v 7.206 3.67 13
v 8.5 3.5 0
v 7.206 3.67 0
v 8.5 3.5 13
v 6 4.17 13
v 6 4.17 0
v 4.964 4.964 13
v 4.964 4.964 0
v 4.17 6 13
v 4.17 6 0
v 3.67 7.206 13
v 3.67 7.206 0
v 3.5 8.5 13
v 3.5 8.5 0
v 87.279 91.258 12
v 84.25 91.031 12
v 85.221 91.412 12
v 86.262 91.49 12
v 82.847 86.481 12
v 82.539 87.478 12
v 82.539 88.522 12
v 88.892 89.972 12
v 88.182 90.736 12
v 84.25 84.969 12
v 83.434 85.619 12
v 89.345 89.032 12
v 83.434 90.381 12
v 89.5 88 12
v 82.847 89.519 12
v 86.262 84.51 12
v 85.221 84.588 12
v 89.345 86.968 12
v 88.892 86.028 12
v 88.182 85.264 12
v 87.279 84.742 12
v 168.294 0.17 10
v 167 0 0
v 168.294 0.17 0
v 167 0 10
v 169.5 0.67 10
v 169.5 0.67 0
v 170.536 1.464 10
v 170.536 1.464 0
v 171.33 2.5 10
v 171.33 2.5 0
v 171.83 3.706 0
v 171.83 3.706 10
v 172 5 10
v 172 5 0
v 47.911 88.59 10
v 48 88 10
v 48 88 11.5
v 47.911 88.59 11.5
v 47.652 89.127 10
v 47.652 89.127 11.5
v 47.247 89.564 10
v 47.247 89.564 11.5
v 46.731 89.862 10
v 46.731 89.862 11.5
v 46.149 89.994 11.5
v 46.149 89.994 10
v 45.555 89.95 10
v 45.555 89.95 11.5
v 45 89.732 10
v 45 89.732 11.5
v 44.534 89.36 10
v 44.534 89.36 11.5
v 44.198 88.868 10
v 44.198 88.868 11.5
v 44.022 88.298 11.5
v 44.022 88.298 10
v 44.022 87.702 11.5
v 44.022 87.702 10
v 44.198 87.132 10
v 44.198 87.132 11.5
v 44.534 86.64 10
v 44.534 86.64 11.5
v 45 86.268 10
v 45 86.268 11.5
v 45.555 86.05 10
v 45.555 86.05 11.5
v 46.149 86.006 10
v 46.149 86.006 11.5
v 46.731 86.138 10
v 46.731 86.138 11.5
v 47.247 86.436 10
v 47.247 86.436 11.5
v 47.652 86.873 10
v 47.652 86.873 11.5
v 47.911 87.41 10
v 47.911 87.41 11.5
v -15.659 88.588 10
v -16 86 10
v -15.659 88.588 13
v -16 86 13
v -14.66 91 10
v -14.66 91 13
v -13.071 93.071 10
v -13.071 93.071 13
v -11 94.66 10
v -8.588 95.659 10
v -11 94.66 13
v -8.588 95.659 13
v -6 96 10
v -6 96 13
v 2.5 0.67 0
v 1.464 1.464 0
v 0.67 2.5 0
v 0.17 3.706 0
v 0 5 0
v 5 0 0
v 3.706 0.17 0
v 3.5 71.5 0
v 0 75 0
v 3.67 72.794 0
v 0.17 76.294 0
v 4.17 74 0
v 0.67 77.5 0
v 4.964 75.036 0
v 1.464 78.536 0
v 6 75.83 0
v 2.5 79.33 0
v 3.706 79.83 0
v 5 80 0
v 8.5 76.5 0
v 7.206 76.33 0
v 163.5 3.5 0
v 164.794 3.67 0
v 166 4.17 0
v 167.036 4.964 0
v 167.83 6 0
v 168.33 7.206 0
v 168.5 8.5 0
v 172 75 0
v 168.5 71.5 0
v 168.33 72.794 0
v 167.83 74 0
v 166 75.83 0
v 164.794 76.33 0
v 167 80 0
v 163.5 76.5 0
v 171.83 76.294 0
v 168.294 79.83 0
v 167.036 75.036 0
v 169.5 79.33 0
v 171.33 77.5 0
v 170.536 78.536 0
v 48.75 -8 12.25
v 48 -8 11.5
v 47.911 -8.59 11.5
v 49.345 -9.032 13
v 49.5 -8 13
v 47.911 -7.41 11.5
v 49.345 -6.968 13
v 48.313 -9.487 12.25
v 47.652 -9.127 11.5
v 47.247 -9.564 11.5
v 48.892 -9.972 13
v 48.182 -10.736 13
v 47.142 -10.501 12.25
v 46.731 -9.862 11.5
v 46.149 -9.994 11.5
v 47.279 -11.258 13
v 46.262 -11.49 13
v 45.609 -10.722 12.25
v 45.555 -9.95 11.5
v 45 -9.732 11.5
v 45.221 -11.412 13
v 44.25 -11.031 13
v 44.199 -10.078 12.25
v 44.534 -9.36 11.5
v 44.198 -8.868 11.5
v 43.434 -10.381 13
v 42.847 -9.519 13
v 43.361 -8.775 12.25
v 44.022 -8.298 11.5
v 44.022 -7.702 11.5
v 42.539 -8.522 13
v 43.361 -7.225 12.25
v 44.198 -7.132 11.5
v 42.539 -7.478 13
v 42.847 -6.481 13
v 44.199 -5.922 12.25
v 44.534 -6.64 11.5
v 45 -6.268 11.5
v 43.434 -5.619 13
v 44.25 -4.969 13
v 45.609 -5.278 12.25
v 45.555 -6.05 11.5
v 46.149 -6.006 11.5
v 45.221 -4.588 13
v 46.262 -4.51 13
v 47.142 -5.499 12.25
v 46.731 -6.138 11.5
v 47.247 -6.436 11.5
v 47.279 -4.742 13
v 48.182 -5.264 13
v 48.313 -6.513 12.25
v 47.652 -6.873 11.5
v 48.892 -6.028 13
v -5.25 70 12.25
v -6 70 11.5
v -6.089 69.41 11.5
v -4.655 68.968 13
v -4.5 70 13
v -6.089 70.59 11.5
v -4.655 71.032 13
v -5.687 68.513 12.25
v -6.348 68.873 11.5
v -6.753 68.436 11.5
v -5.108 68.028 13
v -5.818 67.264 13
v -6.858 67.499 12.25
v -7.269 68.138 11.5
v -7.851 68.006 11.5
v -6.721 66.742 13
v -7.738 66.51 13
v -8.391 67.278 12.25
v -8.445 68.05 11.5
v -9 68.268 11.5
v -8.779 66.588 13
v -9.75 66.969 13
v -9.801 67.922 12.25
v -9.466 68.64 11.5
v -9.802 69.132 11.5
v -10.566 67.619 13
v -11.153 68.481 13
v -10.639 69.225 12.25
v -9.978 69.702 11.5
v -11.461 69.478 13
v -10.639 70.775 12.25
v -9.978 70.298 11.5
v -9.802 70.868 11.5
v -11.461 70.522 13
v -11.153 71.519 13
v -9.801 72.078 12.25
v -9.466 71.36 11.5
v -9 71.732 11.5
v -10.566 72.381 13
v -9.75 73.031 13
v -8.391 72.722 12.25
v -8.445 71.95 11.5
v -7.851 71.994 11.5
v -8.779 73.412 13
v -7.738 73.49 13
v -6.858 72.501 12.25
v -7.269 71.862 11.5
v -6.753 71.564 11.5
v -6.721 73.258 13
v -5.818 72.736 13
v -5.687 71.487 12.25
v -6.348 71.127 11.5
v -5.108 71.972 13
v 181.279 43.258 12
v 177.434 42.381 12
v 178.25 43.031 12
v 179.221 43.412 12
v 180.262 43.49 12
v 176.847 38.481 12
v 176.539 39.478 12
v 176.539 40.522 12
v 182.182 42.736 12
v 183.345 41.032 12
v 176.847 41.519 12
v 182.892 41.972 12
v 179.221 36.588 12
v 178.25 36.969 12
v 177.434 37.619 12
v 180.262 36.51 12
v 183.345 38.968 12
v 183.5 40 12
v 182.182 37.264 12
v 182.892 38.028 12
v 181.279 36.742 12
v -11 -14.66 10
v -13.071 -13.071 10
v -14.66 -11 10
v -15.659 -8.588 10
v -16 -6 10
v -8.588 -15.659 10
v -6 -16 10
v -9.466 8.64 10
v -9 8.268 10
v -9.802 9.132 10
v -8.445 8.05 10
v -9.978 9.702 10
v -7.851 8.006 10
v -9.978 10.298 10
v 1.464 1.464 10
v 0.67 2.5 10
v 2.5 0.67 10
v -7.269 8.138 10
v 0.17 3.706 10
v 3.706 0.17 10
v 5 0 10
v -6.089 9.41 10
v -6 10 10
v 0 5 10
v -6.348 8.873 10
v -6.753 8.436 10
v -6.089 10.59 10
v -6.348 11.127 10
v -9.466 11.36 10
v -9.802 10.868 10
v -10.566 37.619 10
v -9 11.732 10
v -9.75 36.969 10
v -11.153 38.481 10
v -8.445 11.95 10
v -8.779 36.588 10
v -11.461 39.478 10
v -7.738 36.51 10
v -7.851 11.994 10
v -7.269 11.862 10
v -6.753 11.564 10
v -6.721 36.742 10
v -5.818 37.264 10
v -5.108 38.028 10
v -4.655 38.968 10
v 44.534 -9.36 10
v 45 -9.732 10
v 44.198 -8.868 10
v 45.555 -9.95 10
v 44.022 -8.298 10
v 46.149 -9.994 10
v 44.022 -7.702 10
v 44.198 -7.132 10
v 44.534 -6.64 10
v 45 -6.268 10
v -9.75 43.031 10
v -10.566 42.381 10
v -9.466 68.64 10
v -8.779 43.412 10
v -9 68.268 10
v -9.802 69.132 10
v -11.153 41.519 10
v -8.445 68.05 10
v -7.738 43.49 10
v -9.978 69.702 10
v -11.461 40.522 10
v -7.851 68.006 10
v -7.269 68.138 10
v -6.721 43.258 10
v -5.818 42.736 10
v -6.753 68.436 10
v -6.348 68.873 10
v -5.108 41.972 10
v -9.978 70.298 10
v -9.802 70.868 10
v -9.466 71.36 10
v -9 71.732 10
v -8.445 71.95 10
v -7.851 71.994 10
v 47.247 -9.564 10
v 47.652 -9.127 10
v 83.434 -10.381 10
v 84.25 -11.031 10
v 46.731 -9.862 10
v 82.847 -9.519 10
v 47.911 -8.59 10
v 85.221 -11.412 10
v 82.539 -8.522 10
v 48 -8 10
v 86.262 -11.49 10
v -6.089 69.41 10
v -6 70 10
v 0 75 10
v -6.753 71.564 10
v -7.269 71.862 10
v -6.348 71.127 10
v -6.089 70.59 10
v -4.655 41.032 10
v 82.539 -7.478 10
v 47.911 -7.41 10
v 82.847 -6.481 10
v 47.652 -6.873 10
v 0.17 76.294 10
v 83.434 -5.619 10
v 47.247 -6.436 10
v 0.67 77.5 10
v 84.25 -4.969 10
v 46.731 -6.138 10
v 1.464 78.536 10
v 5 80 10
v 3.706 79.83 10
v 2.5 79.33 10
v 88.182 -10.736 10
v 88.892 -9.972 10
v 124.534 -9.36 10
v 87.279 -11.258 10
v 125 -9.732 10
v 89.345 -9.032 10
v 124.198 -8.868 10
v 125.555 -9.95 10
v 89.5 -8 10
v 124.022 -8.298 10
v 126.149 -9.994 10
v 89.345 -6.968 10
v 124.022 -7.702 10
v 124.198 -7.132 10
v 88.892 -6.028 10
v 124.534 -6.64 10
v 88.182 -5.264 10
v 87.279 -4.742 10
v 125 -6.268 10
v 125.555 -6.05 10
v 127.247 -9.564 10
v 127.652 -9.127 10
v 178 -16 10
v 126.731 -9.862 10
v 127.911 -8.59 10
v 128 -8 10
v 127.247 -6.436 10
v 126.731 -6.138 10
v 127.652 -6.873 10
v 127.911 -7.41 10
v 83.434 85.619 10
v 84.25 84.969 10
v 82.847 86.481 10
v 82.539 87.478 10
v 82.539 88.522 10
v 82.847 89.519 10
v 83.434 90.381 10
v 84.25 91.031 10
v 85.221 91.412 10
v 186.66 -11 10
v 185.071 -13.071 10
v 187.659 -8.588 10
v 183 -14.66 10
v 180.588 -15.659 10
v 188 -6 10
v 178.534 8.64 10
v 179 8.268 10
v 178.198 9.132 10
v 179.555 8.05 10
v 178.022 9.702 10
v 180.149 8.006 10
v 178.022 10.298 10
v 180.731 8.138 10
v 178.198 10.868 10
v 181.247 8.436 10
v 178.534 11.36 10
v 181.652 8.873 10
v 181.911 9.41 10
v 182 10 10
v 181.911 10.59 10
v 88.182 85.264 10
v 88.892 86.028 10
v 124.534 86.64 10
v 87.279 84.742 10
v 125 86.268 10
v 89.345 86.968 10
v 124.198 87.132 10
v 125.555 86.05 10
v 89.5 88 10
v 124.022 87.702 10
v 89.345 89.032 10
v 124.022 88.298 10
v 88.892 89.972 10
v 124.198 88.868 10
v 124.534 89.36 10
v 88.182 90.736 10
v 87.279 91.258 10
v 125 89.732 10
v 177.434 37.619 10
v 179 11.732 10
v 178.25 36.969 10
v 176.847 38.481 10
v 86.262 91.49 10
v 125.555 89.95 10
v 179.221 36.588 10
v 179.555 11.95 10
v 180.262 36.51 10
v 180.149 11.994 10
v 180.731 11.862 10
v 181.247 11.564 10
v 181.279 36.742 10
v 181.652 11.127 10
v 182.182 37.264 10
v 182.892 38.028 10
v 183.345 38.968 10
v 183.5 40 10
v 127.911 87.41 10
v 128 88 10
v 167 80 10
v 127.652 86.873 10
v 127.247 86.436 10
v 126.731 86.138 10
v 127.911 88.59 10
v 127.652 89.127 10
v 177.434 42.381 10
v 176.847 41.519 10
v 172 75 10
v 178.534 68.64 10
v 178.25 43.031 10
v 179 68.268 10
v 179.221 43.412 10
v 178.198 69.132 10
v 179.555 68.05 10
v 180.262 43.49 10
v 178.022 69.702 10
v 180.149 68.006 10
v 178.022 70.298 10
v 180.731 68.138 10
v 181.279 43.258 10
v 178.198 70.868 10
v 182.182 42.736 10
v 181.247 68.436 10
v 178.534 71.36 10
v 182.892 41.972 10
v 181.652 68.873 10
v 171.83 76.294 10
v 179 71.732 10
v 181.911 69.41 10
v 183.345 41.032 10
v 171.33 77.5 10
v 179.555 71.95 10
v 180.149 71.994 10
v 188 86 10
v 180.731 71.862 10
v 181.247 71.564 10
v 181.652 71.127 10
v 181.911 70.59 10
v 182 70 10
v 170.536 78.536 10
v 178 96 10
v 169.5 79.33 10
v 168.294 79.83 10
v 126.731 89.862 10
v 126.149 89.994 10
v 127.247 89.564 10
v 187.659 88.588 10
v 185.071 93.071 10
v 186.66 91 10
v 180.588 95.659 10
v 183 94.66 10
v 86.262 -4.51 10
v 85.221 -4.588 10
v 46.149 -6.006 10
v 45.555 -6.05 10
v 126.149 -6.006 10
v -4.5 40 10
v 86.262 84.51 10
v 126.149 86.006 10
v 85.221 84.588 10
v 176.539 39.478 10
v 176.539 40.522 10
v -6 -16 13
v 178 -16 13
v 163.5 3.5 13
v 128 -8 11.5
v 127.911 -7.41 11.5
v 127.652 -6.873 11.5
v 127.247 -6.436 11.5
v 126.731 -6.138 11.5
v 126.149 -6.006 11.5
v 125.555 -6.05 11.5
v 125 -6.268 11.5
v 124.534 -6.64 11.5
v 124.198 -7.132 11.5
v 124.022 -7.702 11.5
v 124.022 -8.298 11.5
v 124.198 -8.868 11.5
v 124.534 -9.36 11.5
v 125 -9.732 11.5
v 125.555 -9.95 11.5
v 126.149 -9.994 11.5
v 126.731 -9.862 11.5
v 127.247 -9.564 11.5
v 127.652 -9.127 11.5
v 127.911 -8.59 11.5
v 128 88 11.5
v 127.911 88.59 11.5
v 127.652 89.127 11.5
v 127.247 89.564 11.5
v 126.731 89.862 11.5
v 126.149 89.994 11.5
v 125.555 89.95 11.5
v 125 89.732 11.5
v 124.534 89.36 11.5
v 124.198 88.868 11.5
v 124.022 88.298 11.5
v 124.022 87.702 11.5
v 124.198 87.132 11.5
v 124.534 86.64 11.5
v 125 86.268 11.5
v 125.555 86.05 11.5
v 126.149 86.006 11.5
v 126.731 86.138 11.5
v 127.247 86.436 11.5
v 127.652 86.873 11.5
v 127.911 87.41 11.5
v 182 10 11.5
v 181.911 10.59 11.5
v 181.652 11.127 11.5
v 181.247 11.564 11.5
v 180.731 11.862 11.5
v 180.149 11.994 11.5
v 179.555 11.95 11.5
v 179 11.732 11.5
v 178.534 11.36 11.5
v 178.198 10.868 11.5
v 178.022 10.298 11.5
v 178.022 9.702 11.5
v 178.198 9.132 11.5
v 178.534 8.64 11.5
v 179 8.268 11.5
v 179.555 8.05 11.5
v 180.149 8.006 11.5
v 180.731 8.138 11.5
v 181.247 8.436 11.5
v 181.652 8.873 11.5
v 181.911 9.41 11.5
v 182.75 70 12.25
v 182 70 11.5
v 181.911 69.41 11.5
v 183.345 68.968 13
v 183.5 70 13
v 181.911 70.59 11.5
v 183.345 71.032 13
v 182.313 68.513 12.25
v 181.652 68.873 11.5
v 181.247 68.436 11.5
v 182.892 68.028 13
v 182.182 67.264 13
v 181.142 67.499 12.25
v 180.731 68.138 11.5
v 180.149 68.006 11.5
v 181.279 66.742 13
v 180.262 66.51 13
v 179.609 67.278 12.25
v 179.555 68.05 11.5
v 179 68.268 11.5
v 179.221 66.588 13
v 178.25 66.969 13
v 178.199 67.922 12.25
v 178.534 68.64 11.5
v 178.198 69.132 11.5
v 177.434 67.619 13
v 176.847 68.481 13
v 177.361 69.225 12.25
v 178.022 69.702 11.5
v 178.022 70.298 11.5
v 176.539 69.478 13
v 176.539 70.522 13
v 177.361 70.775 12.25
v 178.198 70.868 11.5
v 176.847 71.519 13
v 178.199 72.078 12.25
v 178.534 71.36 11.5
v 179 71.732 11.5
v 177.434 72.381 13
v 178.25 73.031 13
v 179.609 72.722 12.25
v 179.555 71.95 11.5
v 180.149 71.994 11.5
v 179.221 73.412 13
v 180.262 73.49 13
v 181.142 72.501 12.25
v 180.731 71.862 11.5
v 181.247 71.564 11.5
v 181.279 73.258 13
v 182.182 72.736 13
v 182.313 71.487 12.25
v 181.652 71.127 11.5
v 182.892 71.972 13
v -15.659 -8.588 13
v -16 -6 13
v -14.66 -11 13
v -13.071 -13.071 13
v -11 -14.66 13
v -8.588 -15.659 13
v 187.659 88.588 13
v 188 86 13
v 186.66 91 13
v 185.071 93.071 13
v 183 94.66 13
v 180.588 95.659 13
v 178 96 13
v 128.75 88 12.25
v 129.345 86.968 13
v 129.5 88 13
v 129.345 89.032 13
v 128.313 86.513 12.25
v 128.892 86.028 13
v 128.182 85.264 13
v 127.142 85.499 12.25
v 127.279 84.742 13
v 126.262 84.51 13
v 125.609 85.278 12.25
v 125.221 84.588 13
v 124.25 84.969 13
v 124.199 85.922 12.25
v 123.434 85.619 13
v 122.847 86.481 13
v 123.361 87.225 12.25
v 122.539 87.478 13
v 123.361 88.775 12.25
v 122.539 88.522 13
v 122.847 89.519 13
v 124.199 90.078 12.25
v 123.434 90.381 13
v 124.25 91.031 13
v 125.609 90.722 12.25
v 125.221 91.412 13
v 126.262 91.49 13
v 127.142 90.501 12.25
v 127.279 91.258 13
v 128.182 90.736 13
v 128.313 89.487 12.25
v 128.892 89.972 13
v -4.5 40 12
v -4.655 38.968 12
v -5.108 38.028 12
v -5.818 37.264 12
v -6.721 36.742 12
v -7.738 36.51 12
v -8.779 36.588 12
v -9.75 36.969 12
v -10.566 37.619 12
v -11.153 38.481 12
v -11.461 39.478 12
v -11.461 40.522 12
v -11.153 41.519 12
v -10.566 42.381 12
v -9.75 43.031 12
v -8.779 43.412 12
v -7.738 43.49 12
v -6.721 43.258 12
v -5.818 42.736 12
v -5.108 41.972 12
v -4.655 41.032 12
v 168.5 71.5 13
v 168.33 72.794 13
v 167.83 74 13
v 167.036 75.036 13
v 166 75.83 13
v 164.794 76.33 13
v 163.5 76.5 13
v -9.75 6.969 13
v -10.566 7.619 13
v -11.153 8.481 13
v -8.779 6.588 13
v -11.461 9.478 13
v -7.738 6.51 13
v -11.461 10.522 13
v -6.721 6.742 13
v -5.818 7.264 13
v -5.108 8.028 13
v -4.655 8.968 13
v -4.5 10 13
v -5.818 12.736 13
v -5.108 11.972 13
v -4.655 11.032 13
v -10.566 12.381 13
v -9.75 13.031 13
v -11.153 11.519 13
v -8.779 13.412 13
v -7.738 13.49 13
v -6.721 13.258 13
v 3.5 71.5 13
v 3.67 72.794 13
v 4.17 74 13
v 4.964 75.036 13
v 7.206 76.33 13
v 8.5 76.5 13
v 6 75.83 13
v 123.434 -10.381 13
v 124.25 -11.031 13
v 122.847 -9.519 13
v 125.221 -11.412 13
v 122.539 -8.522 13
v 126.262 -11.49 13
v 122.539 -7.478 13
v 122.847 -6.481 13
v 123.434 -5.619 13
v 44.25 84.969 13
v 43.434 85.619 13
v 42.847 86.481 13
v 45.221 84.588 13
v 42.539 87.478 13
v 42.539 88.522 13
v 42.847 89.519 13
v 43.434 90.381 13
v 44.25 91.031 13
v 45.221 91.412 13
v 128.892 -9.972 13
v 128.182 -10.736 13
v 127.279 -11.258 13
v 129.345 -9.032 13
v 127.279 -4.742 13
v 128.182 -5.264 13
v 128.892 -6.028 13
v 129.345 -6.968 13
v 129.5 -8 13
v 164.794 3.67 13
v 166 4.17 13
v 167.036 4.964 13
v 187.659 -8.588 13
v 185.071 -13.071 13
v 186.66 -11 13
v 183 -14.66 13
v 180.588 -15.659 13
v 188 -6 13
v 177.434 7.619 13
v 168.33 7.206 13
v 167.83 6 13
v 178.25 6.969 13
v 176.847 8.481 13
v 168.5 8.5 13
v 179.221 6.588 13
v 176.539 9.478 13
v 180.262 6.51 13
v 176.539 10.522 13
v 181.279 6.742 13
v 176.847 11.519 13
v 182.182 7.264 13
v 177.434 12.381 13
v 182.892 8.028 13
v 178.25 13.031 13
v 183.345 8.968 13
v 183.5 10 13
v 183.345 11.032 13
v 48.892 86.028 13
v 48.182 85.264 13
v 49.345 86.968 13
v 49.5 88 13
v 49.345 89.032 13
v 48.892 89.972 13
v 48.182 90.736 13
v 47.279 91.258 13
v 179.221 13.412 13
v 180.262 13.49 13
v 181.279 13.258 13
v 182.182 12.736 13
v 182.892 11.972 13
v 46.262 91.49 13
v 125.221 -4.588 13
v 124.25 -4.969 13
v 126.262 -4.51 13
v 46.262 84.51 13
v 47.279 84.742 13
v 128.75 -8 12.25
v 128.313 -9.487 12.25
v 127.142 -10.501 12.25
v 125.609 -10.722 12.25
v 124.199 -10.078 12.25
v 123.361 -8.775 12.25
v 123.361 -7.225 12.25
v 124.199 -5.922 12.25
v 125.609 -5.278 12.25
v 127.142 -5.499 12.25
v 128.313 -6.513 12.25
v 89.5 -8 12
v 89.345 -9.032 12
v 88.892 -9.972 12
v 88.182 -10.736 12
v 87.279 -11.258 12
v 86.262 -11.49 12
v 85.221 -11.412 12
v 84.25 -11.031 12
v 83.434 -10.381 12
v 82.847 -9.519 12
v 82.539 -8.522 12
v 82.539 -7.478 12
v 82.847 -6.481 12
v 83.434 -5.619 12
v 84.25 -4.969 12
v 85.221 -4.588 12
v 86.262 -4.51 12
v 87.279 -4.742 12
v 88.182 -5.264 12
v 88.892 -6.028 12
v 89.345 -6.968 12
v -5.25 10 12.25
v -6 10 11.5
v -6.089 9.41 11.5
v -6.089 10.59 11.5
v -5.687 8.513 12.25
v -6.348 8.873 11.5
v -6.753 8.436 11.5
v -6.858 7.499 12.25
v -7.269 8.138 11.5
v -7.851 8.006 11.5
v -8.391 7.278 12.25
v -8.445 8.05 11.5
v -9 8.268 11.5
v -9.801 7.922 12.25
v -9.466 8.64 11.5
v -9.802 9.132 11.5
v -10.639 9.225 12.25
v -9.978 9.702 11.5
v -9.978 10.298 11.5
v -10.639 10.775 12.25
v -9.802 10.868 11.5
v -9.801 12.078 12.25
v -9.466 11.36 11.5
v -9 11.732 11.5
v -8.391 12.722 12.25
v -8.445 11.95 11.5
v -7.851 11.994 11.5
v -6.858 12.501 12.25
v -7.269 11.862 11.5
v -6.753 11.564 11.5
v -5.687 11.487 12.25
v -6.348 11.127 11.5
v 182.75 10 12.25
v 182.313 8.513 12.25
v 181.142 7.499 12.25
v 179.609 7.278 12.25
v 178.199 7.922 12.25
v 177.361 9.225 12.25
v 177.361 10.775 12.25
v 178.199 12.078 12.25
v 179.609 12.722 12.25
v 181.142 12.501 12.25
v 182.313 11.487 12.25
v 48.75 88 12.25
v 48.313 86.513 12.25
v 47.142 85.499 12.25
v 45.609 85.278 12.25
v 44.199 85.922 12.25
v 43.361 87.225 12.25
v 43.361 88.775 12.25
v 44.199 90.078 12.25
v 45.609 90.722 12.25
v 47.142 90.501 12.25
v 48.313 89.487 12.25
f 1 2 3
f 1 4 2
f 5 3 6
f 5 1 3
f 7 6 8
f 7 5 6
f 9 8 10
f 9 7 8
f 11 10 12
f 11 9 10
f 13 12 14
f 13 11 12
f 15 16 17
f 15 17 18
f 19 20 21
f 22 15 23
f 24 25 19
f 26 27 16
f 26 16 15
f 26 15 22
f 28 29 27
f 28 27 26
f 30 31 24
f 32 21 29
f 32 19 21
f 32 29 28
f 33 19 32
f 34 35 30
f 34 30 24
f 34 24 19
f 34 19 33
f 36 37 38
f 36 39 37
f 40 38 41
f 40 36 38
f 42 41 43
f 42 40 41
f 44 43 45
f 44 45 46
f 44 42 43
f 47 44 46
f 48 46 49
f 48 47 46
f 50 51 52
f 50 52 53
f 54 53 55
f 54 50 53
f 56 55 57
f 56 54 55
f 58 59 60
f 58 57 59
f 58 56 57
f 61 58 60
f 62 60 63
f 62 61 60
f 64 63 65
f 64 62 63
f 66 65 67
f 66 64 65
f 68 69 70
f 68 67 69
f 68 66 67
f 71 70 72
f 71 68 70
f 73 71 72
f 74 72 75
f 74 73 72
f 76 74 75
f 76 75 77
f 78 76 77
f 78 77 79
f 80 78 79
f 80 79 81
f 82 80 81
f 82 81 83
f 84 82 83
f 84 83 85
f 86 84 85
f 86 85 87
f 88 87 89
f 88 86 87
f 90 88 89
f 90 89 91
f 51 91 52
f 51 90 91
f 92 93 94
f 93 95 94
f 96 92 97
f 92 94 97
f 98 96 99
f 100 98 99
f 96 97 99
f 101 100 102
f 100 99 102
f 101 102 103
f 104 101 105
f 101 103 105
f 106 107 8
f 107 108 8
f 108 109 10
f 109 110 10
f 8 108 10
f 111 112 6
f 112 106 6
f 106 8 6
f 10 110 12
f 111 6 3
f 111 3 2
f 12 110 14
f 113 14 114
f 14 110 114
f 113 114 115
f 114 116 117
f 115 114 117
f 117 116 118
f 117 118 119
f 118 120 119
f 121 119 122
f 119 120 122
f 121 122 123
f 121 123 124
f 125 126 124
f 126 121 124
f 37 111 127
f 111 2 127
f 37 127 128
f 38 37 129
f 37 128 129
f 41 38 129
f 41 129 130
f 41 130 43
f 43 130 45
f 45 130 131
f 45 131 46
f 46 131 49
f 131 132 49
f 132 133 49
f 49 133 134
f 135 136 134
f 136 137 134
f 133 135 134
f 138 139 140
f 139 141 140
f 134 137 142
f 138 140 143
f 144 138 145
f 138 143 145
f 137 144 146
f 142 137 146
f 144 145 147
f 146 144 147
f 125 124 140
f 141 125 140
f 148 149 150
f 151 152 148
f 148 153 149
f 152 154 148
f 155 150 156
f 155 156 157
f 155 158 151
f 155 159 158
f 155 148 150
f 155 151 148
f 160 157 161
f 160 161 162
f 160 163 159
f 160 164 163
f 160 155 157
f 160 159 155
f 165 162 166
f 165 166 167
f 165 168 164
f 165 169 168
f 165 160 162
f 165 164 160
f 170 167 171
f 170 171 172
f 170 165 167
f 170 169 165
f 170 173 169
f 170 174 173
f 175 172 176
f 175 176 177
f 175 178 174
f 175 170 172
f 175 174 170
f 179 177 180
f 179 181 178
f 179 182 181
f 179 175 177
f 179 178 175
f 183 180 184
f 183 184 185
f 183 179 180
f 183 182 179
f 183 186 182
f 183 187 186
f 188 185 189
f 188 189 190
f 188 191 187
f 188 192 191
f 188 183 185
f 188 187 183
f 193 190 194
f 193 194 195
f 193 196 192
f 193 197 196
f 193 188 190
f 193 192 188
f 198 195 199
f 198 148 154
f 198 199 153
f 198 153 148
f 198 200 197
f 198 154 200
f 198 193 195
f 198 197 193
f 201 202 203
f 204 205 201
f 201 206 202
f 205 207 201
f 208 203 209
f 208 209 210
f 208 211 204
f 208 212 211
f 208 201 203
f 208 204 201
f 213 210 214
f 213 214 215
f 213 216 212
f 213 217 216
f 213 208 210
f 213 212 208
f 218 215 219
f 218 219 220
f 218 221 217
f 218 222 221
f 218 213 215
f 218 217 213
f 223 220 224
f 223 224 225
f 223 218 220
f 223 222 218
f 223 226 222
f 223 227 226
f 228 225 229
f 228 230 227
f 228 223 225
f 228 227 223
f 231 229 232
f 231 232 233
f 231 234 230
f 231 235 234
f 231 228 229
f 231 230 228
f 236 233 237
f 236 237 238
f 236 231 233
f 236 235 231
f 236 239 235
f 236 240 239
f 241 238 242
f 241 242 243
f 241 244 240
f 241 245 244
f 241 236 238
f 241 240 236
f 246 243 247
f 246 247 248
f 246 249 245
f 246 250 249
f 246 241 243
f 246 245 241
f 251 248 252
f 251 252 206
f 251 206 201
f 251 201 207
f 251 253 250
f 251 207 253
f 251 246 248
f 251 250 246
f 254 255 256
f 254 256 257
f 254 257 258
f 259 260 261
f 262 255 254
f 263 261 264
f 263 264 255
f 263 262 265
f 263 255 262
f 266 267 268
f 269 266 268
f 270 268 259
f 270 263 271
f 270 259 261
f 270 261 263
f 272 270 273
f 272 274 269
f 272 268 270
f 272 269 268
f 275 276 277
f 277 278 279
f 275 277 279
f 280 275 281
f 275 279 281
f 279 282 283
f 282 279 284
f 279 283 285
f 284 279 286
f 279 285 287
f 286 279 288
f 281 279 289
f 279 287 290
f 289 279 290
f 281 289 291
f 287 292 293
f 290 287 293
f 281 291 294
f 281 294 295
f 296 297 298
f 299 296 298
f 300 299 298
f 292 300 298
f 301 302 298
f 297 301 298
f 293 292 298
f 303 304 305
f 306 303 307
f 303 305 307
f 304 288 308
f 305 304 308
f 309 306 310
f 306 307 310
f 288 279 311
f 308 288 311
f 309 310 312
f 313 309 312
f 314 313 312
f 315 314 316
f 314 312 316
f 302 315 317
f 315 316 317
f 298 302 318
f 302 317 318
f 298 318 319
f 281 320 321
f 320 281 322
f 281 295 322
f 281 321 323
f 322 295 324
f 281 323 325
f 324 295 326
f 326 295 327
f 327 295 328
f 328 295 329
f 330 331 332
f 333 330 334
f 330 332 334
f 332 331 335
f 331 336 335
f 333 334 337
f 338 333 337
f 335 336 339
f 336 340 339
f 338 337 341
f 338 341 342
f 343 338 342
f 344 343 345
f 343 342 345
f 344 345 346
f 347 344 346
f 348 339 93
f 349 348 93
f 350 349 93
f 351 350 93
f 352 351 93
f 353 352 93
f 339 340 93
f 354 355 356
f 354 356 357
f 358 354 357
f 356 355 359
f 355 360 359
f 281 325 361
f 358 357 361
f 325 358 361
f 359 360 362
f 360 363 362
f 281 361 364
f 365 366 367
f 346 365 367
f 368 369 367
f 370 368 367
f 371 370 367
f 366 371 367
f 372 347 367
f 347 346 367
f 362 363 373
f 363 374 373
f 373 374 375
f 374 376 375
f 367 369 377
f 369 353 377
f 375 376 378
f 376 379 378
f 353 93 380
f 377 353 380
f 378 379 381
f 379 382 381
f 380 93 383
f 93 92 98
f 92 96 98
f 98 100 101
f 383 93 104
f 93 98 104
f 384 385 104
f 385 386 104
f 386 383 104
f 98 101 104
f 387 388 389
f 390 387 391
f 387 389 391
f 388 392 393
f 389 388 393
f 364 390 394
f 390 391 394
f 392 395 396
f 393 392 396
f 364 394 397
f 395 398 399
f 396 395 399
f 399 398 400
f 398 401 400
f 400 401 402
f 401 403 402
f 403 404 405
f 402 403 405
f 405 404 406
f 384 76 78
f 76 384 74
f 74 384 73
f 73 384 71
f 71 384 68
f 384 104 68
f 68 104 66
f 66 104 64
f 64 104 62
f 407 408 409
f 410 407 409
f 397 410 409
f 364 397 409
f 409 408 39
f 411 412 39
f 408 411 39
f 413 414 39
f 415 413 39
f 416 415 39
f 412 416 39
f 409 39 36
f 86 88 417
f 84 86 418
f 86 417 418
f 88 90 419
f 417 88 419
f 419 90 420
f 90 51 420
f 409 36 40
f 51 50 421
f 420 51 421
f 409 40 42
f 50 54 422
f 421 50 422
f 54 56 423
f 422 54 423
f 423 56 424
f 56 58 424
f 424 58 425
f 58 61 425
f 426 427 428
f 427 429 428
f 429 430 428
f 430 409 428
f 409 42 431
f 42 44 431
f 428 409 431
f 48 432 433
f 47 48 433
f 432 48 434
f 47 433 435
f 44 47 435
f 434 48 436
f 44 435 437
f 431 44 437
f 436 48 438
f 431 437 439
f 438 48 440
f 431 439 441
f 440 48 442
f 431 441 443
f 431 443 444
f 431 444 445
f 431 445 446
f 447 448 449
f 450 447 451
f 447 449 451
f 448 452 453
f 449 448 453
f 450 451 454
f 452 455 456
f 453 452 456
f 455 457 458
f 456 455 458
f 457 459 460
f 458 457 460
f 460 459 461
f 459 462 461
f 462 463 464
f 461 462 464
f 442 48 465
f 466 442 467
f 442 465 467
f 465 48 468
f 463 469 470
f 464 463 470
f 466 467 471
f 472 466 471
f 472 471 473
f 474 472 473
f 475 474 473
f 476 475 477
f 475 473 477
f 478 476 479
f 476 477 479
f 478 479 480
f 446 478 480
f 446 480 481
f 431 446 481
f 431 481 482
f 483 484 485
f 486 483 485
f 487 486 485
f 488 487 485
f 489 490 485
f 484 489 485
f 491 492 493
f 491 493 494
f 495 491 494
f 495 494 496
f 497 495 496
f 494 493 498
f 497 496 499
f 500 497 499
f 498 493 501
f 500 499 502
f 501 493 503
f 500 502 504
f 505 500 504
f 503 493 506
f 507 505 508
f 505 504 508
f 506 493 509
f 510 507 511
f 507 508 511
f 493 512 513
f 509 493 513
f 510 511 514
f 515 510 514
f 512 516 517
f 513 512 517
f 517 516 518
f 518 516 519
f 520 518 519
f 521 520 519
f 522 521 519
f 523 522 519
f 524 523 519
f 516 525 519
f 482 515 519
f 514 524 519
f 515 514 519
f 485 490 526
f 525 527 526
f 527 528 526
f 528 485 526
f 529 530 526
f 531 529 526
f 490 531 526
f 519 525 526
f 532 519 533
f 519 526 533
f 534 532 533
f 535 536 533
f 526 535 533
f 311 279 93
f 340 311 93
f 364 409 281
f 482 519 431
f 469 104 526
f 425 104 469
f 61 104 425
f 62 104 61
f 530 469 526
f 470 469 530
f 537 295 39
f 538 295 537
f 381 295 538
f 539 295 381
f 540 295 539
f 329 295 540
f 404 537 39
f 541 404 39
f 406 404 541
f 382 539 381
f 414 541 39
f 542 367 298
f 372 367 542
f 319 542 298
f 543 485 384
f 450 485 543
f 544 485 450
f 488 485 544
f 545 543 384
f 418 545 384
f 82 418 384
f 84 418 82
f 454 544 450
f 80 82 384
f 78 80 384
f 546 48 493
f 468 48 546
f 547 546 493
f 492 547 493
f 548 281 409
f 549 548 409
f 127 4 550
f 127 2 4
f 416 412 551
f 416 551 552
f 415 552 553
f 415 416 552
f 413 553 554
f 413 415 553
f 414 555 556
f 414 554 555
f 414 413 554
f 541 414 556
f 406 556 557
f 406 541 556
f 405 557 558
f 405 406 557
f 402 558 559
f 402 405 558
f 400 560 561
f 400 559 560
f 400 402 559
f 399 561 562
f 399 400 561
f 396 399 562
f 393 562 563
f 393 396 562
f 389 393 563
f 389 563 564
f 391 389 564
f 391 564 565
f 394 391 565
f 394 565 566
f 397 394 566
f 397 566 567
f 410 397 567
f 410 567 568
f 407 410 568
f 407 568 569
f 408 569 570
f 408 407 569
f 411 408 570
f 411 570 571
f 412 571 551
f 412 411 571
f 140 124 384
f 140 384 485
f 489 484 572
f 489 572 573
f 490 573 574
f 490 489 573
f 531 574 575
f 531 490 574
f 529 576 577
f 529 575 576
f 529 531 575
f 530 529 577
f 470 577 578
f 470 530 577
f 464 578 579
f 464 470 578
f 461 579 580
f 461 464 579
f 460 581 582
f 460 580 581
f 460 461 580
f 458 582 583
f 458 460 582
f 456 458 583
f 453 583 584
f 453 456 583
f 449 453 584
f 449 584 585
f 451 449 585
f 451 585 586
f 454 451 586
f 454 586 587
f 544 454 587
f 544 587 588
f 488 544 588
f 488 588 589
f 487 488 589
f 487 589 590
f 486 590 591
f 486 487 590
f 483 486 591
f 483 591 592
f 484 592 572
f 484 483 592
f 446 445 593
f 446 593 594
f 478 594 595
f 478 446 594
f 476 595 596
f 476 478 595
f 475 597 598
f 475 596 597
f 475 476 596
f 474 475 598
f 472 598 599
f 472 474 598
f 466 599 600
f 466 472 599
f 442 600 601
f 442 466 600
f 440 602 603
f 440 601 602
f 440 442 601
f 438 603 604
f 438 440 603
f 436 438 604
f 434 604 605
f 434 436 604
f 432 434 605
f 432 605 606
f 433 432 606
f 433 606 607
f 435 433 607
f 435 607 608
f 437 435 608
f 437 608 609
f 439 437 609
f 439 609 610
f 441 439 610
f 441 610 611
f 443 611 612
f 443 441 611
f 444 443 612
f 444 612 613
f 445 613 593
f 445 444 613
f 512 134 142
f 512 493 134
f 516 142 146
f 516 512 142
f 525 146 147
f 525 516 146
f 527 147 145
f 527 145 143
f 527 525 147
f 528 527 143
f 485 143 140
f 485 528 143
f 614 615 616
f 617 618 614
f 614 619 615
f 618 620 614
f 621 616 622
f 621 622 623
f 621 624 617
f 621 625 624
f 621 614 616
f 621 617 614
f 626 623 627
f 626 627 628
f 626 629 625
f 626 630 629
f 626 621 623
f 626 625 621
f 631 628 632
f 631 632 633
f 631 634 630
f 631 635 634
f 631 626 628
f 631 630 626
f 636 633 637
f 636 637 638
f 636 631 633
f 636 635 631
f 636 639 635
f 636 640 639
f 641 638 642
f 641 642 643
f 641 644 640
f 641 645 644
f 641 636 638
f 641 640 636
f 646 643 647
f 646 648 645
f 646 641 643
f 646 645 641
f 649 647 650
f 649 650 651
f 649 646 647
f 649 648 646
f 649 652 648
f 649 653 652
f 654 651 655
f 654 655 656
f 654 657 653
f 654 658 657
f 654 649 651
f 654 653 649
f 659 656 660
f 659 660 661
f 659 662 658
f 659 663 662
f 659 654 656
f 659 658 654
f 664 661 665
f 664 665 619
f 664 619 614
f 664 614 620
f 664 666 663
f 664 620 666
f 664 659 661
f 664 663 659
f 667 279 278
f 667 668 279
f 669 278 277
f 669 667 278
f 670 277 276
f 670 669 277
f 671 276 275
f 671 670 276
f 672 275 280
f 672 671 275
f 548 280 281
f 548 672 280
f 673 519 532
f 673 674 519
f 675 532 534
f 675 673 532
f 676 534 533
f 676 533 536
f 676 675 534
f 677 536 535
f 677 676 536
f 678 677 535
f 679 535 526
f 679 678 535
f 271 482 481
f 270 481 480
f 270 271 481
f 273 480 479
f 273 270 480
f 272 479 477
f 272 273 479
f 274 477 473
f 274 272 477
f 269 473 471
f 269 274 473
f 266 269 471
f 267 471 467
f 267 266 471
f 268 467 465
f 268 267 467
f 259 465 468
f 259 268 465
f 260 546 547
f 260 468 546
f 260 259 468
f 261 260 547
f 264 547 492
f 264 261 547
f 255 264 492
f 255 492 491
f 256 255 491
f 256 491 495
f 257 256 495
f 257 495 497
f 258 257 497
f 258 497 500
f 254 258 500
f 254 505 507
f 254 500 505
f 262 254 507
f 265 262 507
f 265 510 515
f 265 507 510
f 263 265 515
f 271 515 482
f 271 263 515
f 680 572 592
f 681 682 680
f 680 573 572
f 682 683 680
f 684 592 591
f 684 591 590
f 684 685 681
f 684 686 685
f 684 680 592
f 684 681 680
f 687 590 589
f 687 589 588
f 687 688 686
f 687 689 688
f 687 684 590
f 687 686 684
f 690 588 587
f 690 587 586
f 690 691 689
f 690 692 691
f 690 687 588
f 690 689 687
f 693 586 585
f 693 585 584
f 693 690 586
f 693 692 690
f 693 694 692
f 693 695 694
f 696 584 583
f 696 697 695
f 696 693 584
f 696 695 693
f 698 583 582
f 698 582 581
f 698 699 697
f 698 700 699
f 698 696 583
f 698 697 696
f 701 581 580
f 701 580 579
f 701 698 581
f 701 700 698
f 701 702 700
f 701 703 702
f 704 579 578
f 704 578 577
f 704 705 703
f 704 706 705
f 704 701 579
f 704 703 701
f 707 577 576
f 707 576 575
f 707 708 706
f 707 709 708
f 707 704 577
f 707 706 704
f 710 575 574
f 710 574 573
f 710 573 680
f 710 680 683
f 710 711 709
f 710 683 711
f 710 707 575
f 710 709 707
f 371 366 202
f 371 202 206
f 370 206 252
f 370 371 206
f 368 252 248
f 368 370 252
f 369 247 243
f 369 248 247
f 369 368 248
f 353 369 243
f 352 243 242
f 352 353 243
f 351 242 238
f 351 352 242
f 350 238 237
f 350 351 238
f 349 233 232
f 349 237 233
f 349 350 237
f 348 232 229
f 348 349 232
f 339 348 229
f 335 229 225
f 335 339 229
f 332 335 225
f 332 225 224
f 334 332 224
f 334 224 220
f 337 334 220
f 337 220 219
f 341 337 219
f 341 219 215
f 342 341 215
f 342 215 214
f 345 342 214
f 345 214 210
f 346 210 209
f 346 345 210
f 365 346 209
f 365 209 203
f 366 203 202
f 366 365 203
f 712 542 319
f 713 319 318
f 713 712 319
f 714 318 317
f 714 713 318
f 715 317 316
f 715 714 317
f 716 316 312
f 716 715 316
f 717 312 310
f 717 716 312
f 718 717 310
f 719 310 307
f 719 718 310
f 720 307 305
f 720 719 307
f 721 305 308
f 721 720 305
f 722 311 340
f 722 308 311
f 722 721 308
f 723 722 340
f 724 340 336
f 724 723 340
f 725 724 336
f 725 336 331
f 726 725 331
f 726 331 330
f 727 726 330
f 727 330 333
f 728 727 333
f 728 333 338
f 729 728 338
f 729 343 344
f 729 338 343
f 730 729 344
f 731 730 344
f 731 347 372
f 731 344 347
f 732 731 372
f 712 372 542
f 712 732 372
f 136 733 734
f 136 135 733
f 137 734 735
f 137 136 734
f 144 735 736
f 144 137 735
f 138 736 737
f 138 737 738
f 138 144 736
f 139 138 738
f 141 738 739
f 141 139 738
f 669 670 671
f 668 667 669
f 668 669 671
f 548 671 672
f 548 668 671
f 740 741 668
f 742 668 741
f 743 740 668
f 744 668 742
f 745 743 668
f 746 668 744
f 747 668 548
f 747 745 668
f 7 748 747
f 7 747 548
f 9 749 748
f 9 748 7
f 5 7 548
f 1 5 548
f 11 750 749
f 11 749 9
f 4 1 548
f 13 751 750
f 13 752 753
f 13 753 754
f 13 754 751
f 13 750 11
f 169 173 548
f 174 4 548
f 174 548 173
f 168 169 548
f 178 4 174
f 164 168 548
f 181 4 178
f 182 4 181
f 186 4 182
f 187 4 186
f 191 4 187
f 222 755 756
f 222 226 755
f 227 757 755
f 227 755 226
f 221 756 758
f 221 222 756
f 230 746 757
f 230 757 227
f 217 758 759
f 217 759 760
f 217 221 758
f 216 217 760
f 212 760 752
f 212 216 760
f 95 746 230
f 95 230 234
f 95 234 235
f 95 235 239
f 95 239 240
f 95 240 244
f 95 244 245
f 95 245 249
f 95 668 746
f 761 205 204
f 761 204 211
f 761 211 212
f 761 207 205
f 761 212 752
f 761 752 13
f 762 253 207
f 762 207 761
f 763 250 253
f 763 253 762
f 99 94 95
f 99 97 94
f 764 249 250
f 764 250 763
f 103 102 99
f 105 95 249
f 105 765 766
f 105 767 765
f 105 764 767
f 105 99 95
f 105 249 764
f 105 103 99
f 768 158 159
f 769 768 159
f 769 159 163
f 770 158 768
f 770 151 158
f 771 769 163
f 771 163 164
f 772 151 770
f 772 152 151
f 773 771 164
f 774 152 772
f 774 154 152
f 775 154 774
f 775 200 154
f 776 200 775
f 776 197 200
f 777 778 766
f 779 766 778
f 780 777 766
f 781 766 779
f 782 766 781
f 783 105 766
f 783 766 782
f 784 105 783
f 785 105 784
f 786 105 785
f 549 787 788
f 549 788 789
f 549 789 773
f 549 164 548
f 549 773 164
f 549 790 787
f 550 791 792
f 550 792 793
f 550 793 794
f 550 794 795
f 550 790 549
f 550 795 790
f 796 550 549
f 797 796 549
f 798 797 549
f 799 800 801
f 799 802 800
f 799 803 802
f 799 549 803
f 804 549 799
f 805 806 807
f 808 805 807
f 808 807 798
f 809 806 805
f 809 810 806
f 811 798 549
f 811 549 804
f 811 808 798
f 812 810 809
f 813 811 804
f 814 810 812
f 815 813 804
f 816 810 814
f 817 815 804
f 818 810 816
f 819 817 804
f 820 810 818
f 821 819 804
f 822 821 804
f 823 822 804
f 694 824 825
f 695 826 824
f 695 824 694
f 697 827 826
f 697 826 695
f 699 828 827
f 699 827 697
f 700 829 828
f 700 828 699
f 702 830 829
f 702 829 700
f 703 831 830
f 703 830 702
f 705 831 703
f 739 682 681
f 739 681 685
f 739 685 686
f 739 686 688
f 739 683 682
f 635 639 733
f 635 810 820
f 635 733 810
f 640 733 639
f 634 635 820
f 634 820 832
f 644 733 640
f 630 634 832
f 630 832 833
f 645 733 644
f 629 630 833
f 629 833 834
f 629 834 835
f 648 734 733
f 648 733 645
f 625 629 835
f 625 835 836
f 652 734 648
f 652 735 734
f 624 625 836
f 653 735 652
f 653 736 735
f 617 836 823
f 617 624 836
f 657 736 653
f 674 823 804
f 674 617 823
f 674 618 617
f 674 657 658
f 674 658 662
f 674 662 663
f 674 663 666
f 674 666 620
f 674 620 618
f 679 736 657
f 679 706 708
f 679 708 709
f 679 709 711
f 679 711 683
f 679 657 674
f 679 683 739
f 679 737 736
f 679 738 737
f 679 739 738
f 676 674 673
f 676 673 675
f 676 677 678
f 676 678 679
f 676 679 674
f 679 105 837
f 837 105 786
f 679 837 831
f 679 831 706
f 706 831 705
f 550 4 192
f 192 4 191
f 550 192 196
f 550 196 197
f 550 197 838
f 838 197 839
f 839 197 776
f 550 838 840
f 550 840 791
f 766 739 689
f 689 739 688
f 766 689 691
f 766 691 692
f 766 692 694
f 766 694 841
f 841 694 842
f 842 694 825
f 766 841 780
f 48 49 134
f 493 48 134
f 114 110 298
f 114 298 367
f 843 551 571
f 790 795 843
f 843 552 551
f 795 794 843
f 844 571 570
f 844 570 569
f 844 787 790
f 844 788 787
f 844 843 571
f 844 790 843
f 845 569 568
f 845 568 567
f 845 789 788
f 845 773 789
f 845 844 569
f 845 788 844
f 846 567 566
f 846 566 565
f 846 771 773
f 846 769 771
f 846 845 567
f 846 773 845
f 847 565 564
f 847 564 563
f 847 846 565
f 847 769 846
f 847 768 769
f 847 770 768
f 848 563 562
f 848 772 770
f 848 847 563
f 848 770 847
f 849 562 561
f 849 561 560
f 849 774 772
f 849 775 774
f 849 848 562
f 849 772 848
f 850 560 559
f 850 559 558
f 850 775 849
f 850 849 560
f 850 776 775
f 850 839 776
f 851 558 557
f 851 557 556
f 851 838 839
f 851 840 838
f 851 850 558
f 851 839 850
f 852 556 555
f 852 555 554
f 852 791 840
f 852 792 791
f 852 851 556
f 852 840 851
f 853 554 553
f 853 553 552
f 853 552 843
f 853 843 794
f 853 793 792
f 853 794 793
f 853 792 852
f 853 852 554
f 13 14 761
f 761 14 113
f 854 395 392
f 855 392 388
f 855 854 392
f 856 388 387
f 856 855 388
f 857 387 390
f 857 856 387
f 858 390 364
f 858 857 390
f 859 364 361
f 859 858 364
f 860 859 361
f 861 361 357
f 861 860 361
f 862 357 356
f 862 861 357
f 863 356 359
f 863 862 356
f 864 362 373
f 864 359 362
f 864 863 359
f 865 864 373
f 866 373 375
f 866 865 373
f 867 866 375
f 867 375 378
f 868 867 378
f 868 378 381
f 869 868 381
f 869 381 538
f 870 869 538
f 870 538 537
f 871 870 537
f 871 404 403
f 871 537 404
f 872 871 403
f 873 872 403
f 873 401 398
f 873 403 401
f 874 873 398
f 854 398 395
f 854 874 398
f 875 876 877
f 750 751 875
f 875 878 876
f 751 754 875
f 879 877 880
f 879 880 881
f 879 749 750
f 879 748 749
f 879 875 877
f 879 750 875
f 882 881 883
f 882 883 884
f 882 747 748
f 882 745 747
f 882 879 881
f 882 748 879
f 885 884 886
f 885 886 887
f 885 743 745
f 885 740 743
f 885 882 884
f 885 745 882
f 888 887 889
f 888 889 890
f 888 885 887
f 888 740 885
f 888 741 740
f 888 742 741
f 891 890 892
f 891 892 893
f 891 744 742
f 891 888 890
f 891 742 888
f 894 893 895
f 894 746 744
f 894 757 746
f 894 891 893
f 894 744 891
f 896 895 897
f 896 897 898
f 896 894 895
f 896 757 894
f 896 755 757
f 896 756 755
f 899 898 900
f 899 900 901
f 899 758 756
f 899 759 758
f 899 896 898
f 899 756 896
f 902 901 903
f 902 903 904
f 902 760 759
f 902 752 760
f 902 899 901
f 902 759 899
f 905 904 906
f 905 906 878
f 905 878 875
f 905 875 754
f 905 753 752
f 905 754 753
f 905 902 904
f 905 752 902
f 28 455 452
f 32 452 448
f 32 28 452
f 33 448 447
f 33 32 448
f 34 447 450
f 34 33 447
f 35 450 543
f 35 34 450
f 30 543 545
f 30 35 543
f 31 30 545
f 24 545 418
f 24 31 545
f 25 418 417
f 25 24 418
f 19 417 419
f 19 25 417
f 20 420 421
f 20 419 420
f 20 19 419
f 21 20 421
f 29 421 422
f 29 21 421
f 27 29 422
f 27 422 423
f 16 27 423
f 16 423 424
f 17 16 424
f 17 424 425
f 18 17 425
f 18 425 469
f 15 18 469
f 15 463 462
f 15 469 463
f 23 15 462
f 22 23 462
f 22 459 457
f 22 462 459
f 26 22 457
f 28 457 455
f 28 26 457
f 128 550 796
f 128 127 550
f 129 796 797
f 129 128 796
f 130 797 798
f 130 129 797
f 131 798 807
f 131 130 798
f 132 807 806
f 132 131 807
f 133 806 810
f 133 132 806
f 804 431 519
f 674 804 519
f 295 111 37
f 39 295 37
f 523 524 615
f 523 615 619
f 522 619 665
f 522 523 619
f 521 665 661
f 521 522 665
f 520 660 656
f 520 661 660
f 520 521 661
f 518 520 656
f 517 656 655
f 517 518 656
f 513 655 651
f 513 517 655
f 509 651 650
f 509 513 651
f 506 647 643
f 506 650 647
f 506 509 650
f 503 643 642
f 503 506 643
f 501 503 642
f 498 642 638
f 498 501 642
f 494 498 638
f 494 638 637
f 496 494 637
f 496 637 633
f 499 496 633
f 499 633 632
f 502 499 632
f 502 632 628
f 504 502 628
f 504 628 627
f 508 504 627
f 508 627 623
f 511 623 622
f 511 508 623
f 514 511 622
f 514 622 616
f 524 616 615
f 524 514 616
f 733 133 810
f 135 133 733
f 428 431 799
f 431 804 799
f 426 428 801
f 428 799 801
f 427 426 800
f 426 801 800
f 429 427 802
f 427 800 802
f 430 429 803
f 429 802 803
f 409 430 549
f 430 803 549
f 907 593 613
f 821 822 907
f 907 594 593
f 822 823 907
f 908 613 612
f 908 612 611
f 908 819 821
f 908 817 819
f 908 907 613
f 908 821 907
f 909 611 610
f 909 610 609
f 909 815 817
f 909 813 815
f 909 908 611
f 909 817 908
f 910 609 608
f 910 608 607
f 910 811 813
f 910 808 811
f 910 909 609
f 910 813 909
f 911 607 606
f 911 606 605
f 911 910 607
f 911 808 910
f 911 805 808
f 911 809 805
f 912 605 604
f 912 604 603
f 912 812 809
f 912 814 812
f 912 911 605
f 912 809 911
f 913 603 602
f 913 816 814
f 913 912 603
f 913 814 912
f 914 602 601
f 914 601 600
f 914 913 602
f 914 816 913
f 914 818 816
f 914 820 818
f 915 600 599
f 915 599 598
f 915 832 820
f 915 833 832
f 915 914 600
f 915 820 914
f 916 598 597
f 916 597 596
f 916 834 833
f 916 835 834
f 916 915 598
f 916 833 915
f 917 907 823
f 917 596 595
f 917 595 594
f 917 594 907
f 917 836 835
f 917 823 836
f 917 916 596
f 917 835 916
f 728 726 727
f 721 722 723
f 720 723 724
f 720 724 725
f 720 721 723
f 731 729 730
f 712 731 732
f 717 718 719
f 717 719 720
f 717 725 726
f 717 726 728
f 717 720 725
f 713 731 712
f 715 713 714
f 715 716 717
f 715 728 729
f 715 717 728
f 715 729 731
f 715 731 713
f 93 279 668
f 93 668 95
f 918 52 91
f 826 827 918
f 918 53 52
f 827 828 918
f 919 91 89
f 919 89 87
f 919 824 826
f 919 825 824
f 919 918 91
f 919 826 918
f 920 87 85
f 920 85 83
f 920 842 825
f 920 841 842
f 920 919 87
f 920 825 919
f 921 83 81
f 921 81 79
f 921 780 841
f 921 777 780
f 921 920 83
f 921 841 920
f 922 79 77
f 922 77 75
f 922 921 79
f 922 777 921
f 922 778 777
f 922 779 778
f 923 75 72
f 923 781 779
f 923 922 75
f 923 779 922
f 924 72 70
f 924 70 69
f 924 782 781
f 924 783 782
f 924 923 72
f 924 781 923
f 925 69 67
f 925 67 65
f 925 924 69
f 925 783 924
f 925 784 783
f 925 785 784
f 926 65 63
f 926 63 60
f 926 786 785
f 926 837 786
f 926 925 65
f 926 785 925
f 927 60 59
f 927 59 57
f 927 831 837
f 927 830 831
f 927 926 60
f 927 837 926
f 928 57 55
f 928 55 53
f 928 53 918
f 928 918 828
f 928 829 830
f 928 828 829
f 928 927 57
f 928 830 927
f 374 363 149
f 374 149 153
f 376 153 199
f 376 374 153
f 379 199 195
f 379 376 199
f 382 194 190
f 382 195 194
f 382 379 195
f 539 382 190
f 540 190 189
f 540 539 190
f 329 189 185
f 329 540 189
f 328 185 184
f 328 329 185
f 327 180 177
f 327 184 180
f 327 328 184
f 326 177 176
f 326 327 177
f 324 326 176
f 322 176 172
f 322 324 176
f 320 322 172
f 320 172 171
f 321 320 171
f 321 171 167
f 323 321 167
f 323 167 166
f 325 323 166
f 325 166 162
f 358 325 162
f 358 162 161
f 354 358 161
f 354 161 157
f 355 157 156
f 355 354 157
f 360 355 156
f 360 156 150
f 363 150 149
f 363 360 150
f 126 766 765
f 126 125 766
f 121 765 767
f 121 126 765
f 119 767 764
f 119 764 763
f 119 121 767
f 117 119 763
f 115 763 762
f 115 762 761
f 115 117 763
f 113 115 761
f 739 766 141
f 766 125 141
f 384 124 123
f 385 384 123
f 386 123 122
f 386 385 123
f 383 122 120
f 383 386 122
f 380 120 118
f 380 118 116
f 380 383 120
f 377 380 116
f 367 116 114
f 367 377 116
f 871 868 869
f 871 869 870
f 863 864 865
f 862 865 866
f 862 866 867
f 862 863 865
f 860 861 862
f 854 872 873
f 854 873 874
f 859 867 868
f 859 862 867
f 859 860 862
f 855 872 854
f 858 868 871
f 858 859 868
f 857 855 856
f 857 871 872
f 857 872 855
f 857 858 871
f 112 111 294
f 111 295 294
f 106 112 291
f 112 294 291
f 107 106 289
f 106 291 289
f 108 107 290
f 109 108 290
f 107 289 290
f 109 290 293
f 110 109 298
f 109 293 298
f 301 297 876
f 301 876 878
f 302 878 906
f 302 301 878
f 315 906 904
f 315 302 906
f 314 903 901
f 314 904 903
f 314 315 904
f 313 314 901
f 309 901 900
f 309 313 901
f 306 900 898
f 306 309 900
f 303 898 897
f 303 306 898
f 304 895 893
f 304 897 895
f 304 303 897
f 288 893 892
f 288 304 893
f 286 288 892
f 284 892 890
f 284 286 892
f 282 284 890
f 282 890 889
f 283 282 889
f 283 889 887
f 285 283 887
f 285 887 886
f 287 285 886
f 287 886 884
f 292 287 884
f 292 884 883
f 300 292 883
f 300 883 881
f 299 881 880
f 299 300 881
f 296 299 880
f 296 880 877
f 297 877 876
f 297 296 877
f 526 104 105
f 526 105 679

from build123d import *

# Parameters (mm, degrees)
ESQUISSE1_W                  = 172
ESQUISSE1_H                  = 80
ESQUISSE1_W_2                = 165
ESQUISSE1_H_2                = 73
BOSS_EXTRU_1_DEPTH           = 10
ESQUISSE2_W                  = 204
ESQUISSE2_H                  = 112
ESQUISSE2_W_2                = 165
ESQUISSE2_H_2                = 73
BOSS_EXTRU_2_DEPTH           = 3
CONG_1_R                     = 10
CONG_2_R                     = 5
ENL_V_MAT_EXTRU_1_DEPTH      = 212.329127193
ENL_V_MAT_EXTRU_1_DEPTH_BACK = 2
ESQUISSE3_R                  = 3.5
ENL_V_MAT_EXTRU_2_DEPTH      = 212.492316645
ENL_V_MAT_EXTRU_2_DEPTH_BACK = 212.492316645
ESQUISSE4_R                  = 2
CHANFREIN1_SIZE              = 1.5


with BuildPart() as part:
    # Esquisse1 → Boss.-Extru.1 (new body)
    with BuildSketch(Plane.XY):
        with Locations((86, 40)):
            Rectangle(ESQUISSE1_W, ESQUISSE1_H)
        with Locations((86, 40)):
            Rectangle(ESQUISSE1_W_2, ESQUISSE1_H_2, mode=Mode.SUBTRACT)
    extrude(amount=BOSS_EXTRU_1_DEPTH)

    # Esquisse2 → Boss.-Extru.2 (add)
    with BuildSketch(Plane.XY.offset(10)):
        with Locations((86, 40)):
            Rectangle(ESQUISSE2_W, ESQUISSE2_H)
        with Locations((86, 40)):
            Rectangle(ESQUISSE2_W_2, ESQUISSE2_H_2, mode=Mode.SUBTRACT)
    extrude(amount=BOSS_EXTRU_2_DEPTH)

    # Congé1
    cong_1_edges = [part.edges().sort_by_distance(p)[0] for p in [
        (-16, 96, 11.5),
        (-16, -16, 11.5),
        (188, -16, 11.5),
        (188, 96, 11.5),
    ]]
    fillet(cong_1_edges, radius=CONG_1_R)

    # Congé2
    cong_2_edges = [part.edges().sort_by_distance(p)[0] for p in [
        (3.5, 76.5, 6.5),
        (3.5, 3.5, 6.5),
        (168.5, 3.5, 6.5),
        (168.5, 76.5, 6.5),
        (0, 80, 5),
        (172, 80, 5),
        (172, 0, 5),
        (0, 0, 5),
    ]]
    fillet(cong_2_edges, radius=CONG_2_R)

    # Esquisse3 → Enlèv. mat.-Extru.1 (cut, two sides: drawn at the far end of the back side and taken through both)
    with BuildSketch(Plane(origin=(0, 0, 10), x_dir=(-1, 0, 0), z_dir=(0, 0, -1)).offset(-ENL_V_MAT_EXTRU_1_DEPTH_BACK)):
        with Locations(Location((-180, 40, 0), (0, 0, 180))):
            Circle(ESQUISSE3_R)
        with Locations(Location((8, 40, 0), (0, 0, 180))):
            Circle(ESQUISSE3_R)
        with Locations(Location((-86, -8, 0), (0, 0, 180))):
            Circle(ESQUISSE3_R)
        with Locations(Location((-86, 88, 0), (0, 0, 180))):
            Circle(ESQUISSE3_R)
    extrude(amount=ENL_V_MAT_EXTRU_1_DEPTH + ENL_V_MAT_EXTRU_1_DEPTH_BACK, mode=Mode.SUBTRACT)

    # Esquisse4 → Enlèv. mat.-Extru.2 (cut, two sides: drawn at the far end of the back side and taken through both)
    with BuildSketch(Plane.XY.offset(13).offset(-ENL_V_MAT_EXTRU_2_DEPTH_BACK)):
        with Locations((-8, 70)):
            Circle(ESQUISSE4_R)
        with Locations((-8, 10)):
            Circle(ESQUISSE4_R)
        with Locations((180, 10)):
            Circle(ESQUISSE4_R)
        with Locations((180, 70)):
            Circle(ESQUISSE4_R)
        with Locations((46, 88)):
            Circle(ESQUISSE4_R)
        with Locations((126, 88)):
            Circle(ESQUISSE4_R)
        with Locations((126, -8)):
            Circle(ESQUISSE4_R)
        with Locations((46, -8)):
            Circle(ESQUISSE4_R)
    extrude(amount=ENL_V_MAT_EXTRU_2_DEPTH + ENL_V_MAT_EXTRU_2_DEPTH_BACK, mode=Mode.SUBTRACT)

    # Chanfrein1
    chanfrein1_edges = [part.edges().sort_by_distance(p)[0] for p in [
        (-10, 70, 13),
        (44, -8, 13),
        (124, -8, 13),
        (124, 88, 13),
        (44, 88, 13),
        (178, 70, 13),
        (178, 10, 13),
        (-10, 10, 13),
    ]]
    chamfer(chanfrein1_edges, length=CHANFREIN1_SIZE)


solid = part.part
